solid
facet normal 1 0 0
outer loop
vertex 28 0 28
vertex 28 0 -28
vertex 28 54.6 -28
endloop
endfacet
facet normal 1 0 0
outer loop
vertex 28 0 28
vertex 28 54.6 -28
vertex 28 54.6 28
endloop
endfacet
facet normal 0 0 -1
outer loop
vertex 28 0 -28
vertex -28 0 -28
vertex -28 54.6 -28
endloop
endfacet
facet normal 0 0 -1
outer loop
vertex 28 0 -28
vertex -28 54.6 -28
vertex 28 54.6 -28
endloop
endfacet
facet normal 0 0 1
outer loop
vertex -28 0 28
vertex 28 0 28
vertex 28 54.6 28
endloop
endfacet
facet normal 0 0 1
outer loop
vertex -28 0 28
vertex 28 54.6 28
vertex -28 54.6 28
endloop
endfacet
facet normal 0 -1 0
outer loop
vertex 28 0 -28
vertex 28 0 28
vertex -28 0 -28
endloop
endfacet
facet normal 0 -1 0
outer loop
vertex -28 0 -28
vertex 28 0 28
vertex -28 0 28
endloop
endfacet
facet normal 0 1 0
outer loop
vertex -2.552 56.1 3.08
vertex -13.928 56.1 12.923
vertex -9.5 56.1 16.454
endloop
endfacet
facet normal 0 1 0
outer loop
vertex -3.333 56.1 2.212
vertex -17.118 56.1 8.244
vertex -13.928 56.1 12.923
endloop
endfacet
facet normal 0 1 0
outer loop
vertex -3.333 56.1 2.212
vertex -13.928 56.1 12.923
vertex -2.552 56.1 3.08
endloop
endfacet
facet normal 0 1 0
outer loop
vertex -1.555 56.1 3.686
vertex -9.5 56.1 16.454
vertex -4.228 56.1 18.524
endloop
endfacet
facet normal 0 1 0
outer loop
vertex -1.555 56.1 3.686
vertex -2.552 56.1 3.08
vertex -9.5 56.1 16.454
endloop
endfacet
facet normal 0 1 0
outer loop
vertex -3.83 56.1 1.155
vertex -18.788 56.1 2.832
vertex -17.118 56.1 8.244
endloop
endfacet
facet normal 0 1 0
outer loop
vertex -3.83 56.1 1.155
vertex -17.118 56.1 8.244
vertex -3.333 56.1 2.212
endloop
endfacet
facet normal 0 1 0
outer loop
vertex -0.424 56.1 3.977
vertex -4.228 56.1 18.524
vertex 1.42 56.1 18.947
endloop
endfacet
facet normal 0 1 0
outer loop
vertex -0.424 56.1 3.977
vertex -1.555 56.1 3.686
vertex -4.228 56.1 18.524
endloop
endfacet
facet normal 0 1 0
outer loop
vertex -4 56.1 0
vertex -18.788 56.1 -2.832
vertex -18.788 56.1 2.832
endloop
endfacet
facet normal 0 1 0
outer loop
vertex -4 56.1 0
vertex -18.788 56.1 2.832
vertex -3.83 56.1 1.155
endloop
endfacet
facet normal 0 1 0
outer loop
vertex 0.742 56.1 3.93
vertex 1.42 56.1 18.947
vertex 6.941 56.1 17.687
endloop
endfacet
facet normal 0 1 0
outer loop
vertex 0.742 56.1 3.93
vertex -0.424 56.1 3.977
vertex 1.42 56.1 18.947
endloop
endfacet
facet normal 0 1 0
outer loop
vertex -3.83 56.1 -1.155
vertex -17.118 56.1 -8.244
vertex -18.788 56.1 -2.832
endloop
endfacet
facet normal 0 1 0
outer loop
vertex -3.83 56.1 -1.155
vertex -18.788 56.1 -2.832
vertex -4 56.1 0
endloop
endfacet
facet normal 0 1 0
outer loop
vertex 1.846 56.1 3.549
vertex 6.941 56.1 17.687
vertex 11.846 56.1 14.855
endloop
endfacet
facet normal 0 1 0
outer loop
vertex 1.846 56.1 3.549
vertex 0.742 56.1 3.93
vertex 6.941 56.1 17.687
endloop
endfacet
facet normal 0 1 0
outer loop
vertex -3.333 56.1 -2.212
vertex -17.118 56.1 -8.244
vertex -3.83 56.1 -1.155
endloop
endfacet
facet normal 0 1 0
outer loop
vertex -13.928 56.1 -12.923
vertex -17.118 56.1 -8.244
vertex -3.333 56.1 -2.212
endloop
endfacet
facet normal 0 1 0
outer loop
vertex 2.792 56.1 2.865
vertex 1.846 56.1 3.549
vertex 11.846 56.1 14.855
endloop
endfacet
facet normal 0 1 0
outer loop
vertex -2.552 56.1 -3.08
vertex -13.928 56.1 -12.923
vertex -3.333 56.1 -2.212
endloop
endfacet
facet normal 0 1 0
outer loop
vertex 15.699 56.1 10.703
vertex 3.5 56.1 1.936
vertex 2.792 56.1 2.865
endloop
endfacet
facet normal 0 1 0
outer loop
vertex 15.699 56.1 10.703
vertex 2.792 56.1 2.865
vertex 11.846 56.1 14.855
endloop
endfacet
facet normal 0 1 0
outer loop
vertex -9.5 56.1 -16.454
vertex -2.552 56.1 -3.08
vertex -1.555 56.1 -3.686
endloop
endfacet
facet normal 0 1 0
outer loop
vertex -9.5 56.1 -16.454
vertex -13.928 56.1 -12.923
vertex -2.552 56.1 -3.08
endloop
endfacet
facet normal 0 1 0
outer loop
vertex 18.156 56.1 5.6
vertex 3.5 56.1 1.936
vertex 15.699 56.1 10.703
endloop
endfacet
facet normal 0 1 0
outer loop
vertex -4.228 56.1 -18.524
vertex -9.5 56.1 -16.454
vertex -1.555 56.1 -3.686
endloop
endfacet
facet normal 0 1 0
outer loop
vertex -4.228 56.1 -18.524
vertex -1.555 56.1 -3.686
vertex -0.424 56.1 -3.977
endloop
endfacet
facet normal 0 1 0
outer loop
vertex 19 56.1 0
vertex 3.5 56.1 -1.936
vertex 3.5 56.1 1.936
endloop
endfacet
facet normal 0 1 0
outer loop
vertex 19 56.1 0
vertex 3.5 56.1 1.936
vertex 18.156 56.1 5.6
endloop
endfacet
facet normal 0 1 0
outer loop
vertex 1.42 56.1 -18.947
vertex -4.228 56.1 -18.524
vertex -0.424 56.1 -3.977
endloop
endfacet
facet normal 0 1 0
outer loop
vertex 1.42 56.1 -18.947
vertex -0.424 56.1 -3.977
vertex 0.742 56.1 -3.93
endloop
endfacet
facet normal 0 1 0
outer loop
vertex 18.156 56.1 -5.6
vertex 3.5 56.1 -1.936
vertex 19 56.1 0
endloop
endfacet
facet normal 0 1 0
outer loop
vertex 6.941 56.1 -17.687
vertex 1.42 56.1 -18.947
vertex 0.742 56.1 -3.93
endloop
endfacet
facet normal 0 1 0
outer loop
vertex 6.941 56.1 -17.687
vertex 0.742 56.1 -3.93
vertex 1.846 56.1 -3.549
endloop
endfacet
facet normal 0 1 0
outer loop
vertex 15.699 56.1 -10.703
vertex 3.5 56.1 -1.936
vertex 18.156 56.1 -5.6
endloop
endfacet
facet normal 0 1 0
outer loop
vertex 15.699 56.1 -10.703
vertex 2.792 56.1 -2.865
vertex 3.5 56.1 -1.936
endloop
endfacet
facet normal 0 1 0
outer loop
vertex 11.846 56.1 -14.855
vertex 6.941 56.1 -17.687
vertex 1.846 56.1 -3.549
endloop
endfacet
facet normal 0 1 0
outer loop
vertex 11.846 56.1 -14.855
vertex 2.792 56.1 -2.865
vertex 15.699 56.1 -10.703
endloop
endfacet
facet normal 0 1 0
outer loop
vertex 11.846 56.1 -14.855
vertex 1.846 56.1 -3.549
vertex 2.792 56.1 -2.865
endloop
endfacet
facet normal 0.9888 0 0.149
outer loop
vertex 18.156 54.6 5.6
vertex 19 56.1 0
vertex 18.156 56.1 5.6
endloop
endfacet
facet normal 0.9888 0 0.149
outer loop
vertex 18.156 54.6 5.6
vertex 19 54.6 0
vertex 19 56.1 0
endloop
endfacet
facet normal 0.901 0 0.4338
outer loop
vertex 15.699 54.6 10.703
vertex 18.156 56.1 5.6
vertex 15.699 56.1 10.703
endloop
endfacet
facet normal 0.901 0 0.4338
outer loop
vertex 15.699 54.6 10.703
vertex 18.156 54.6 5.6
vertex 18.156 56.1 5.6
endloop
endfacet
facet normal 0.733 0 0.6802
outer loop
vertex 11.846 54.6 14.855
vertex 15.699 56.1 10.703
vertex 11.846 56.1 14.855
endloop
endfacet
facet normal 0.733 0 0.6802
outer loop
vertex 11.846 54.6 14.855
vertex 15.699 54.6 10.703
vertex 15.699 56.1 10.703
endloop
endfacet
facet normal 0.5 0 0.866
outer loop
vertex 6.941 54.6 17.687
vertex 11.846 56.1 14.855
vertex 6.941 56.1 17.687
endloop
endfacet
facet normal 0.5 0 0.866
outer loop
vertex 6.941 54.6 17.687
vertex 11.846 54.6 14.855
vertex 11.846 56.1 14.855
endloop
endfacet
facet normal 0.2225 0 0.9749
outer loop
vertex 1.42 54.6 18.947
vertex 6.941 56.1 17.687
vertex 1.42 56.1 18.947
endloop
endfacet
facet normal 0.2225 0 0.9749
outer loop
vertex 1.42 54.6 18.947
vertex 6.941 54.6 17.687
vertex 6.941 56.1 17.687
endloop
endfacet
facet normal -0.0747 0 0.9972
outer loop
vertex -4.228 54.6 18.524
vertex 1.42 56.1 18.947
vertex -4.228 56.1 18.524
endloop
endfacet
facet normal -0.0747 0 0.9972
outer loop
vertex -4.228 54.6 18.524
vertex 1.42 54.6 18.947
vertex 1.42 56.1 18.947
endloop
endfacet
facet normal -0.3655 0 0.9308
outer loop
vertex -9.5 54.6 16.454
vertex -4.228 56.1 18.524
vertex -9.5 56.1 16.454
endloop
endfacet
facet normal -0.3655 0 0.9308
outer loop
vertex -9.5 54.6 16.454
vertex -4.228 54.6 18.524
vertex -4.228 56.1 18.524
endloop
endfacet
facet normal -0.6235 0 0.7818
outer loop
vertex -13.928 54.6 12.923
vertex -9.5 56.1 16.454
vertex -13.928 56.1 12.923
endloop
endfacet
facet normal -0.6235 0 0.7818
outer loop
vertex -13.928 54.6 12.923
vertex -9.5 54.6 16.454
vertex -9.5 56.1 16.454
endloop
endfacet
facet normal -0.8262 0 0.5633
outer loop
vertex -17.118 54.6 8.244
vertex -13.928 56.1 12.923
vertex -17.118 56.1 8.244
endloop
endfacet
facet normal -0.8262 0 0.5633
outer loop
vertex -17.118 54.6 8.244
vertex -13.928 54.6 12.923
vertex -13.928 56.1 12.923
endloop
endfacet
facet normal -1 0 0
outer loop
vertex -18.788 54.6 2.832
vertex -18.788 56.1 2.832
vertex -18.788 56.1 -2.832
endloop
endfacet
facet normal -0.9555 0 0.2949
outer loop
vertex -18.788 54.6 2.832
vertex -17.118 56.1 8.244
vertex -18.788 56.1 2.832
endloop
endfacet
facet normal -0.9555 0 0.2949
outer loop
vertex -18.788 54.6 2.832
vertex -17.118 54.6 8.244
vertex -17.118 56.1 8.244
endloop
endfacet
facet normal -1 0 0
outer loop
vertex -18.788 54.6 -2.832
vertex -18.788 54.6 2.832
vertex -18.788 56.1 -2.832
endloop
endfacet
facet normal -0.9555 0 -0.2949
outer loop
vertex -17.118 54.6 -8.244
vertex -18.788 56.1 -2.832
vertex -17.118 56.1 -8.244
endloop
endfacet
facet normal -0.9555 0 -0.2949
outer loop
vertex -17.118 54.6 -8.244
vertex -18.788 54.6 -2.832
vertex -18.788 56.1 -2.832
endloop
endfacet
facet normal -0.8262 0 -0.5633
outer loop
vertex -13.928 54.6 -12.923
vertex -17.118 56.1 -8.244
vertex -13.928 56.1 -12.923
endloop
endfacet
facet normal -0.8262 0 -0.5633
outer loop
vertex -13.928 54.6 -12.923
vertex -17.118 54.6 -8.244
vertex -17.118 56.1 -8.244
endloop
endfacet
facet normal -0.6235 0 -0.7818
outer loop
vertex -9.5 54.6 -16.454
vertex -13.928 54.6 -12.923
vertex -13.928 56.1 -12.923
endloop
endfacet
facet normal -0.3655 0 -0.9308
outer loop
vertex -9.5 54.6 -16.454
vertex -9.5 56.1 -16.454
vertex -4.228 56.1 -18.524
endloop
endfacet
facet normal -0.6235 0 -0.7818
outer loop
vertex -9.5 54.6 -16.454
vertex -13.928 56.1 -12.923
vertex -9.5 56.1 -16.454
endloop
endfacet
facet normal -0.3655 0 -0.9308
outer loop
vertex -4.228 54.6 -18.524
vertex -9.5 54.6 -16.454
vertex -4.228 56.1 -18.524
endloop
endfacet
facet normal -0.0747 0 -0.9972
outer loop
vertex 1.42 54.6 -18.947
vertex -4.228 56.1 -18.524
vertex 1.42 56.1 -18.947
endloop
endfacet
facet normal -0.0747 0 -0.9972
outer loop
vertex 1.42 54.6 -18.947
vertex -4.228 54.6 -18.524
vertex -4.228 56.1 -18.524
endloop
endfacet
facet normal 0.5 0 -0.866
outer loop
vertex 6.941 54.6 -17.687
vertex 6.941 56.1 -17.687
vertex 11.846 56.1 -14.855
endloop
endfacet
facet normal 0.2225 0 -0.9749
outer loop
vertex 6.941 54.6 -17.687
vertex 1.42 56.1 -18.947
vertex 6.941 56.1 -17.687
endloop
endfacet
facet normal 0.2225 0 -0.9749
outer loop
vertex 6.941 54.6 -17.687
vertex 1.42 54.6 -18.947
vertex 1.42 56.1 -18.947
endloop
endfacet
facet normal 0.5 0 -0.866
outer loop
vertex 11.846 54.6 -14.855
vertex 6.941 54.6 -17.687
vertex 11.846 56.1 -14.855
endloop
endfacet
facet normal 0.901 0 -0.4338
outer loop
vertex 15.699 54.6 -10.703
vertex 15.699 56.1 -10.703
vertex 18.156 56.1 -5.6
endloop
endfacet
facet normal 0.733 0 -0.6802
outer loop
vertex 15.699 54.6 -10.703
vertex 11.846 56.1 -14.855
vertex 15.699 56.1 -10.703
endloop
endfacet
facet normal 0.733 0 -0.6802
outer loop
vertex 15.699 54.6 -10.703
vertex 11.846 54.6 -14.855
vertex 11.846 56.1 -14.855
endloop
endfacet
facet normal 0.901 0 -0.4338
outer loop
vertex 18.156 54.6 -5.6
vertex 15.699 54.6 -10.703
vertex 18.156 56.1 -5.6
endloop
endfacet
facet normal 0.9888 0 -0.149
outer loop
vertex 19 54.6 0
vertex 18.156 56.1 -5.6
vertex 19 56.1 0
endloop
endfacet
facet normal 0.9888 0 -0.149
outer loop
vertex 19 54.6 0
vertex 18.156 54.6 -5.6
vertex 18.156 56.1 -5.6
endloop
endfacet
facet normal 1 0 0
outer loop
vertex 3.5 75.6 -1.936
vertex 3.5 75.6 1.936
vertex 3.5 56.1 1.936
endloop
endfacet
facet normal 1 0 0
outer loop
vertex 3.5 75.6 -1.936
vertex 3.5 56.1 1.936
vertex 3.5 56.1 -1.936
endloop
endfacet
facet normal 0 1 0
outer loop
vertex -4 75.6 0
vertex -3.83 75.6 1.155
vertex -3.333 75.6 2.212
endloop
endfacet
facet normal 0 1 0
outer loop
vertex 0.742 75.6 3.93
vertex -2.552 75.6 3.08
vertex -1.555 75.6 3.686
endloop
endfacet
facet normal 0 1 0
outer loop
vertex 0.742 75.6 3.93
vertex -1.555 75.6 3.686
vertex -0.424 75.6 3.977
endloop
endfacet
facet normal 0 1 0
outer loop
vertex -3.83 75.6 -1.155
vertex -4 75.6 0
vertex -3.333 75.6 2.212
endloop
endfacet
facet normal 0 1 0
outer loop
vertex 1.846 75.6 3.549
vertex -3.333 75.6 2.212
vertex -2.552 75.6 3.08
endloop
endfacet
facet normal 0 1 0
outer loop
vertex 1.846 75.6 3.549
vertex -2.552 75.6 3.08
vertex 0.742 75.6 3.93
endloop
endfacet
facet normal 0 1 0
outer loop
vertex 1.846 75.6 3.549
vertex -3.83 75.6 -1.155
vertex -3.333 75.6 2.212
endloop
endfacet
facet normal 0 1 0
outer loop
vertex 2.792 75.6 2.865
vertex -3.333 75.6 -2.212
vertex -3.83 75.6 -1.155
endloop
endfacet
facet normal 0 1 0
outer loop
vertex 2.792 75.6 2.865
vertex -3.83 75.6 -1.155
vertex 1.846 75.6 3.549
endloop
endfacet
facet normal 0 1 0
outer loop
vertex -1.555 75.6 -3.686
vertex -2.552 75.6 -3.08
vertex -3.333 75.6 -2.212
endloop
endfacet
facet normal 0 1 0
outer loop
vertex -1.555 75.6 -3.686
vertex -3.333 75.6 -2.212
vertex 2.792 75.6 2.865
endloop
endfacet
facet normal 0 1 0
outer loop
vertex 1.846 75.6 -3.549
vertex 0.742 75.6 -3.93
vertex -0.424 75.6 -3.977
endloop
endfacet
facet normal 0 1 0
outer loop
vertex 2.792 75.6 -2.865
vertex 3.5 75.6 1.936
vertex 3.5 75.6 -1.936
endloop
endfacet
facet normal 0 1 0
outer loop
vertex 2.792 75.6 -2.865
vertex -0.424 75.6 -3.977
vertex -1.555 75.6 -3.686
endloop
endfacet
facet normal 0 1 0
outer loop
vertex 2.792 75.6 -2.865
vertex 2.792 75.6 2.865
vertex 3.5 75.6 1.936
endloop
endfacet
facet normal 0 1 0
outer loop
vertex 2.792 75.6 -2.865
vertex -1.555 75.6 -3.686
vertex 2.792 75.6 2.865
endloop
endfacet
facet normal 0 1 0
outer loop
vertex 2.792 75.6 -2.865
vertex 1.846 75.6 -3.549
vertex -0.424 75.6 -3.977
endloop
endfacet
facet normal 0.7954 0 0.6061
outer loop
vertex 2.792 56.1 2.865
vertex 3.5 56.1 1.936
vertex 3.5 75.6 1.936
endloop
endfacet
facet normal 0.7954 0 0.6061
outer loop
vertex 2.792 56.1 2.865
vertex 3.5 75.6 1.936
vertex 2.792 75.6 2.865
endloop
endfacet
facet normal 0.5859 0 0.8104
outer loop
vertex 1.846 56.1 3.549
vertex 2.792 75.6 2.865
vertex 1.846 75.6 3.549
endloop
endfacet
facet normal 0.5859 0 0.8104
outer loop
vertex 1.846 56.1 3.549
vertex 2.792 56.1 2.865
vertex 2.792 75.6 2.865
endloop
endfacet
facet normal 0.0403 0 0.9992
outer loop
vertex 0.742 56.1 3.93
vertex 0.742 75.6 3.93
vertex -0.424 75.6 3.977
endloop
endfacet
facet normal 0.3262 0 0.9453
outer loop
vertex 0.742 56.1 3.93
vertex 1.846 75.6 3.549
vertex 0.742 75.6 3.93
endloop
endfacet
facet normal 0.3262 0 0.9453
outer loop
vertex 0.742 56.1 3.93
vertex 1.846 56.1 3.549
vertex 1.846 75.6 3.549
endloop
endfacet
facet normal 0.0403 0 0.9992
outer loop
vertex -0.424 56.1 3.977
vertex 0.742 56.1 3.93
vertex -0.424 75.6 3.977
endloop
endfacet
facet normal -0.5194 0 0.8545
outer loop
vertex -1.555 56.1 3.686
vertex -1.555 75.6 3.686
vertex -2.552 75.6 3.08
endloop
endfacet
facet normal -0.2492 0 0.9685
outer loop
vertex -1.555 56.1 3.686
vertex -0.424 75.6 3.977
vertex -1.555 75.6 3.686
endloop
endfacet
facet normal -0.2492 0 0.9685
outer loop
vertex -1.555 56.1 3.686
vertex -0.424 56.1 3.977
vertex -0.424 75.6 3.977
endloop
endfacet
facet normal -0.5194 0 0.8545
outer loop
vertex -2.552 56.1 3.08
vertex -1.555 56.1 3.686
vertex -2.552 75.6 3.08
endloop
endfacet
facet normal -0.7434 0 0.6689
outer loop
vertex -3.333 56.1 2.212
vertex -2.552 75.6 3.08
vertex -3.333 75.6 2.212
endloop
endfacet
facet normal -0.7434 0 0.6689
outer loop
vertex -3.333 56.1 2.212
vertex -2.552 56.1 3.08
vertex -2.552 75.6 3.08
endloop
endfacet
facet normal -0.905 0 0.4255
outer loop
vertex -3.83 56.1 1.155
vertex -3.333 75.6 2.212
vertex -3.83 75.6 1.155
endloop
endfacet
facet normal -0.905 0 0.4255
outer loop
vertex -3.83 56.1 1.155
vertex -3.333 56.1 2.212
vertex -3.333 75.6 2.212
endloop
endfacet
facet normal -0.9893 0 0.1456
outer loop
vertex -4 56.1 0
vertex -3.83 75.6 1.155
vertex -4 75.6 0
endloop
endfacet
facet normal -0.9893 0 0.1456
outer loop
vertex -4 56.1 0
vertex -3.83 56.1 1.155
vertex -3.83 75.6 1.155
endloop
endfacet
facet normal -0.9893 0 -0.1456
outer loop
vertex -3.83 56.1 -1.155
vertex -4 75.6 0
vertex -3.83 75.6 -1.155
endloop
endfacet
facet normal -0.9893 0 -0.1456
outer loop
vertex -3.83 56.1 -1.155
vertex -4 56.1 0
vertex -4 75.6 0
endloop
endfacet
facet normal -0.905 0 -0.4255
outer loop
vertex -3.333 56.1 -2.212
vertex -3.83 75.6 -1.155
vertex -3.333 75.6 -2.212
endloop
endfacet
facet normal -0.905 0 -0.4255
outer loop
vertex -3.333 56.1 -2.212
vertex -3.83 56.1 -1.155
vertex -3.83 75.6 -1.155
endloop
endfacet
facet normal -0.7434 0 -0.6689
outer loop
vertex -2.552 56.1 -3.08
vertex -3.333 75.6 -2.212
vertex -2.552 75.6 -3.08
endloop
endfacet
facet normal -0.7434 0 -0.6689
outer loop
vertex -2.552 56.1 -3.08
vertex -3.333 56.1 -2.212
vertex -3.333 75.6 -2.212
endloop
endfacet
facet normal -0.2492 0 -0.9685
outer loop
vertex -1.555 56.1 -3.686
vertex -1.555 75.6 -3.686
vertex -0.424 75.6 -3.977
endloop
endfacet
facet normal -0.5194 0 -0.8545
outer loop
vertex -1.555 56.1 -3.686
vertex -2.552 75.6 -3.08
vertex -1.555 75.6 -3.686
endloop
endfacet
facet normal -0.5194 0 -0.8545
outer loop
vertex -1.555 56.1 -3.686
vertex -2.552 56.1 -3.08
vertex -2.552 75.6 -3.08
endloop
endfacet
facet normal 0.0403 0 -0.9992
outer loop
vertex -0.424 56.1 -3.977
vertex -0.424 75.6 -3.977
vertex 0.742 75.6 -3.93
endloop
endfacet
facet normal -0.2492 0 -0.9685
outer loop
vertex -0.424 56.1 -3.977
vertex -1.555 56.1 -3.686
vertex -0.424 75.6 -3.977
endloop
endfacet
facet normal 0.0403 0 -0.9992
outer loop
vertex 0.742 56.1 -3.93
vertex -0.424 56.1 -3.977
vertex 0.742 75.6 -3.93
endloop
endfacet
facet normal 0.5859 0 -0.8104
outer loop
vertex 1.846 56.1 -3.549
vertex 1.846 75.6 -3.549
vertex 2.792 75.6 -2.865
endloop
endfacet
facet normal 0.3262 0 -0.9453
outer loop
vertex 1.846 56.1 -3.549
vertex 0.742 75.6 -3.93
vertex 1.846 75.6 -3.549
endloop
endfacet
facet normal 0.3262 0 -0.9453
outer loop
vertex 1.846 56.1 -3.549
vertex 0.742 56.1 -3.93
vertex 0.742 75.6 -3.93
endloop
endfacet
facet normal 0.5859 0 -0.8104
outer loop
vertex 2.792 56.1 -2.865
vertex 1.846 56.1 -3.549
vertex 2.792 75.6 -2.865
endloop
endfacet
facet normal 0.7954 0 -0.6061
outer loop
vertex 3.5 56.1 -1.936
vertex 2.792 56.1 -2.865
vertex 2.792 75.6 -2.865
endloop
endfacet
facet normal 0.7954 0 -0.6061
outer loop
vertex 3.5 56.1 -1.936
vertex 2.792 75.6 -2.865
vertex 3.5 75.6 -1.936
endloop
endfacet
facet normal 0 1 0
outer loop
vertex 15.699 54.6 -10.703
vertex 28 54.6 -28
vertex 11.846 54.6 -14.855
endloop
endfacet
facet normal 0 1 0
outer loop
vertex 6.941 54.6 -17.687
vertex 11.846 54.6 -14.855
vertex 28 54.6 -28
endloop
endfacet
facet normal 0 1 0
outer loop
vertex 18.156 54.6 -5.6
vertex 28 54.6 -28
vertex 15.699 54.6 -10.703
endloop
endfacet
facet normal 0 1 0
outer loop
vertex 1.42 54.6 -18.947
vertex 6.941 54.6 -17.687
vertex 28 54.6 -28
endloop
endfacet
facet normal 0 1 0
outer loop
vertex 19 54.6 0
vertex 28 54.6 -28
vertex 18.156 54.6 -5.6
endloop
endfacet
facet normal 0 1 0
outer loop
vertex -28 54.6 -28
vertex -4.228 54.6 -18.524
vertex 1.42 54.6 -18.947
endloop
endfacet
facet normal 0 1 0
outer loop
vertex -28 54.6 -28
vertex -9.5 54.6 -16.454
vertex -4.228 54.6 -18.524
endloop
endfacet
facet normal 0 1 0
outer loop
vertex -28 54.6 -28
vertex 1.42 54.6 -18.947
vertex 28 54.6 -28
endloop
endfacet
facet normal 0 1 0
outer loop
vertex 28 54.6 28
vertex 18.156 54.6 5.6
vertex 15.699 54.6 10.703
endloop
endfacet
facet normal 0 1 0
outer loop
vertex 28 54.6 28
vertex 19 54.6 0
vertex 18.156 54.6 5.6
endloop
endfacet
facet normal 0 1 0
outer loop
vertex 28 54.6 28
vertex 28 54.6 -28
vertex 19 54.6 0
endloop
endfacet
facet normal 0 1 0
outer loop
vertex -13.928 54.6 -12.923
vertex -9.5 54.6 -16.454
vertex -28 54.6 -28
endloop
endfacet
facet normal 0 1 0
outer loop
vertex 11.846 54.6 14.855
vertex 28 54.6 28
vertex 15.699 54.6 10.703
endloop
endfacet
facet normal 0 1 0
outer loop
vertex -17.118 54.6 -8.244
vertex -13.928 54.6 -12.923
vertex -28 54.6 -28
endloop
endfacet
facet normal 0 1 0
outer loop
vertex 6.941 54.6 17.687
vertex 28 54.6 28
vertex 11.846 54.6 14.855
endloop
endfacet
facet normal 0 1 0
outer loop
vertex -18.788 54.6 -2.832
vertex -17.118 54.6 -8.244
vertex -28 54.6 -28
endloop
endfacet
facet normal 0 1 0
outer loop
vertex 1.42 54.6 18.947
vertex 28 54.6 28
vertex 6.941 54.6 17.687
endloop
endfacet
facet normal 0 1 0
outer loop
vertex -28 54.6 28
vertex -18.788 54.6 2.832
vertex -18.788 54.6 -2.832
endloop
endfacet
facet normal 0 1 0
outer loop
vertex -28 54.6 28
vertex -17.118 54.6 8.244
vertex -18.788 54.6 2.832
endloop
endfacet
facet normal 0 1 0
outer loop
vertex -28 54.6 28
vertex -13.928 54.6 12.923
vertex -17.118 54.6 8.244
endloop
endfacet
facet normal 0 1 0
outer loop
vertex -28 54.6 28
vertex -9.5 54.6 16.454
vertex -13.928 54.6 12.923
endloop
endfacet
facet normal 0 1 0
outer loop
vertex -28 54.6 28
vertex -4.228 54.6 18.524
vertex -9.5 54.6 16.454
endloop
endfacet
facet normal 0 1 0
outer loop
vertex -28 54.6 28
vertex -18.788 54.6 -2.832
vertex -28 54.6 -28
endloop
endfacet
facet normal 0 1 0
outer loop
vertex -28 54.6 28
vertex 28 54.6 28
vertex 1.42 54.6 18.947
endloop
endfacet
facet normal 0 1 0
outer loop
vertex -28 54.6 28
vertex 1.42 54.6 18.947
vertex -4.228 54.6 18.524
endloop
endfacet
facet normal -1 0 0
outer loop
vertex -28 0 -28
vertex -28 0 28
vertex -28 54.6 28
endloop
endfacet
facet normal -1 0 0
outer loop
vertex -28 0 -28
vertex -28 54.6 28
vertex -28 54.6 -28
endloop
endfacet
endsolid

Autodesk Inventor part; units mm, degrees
ref_plane "YZ Plane" through (0, 0, 0) normal (1, 0, 0) x (0, 1, 0)
ref_plane "XZ Plane" through (0, 0, 0) normal (0, 1, 0) x (-1, 0, 0)
ref_plane "XY Plane" through (0, 0, 0) normal (0, 0, 1) x (1, 0, 0)
sketch "Sketch1" plane through (0, 0, 0) normal (0, 1, 0) x (-1, 0, 0)
  line L0 (-28, 28) -> (28, 28)
  line L1 (28, 28) -> (28, -28)
  line L2 (28, -28) -> (-28, -28)
  line L3 (-28, -28) -> (-28, 28)
  line L4 (-28, 28) -> (28, -28) construction
  line L5 (28, 28) -> (-28, -28) construction
  point P0 (0, 0)
  dimension "d0" = 56
  dimension "d1" = 56
extrude "Extrusion1" add sketch "Sketch1" along normal blind 54.6
sketch "Sketch2" plane through (0, 54.6, 0) normal (0, 1, 0) x (1, 0, 0)
  circle A0 centre (0, 0) radius 19
  dimension "d4" = 38
extrude "Extrusion2" add sketch "Sketch2" along normal blind 1.5
sketch "Sketch3" plane through (0, 56.1, 0) normal (0, 1, 0) x (1, 0, 0)
  arc A0 (3.5, 1.9365) -> (3.5, -1.9365) centre (0, 0) ccw
  line L0 (3.5, -1.9365) -> (3.5, 1.9365)
  point P0 (4, 0)
  dimension "d7" = 8
  dimension "d8" = 0.5
extrude "Extrusion3" add sketch "Sketch3" along normal blind 19.5
properties part number "Linear Rail motor"
